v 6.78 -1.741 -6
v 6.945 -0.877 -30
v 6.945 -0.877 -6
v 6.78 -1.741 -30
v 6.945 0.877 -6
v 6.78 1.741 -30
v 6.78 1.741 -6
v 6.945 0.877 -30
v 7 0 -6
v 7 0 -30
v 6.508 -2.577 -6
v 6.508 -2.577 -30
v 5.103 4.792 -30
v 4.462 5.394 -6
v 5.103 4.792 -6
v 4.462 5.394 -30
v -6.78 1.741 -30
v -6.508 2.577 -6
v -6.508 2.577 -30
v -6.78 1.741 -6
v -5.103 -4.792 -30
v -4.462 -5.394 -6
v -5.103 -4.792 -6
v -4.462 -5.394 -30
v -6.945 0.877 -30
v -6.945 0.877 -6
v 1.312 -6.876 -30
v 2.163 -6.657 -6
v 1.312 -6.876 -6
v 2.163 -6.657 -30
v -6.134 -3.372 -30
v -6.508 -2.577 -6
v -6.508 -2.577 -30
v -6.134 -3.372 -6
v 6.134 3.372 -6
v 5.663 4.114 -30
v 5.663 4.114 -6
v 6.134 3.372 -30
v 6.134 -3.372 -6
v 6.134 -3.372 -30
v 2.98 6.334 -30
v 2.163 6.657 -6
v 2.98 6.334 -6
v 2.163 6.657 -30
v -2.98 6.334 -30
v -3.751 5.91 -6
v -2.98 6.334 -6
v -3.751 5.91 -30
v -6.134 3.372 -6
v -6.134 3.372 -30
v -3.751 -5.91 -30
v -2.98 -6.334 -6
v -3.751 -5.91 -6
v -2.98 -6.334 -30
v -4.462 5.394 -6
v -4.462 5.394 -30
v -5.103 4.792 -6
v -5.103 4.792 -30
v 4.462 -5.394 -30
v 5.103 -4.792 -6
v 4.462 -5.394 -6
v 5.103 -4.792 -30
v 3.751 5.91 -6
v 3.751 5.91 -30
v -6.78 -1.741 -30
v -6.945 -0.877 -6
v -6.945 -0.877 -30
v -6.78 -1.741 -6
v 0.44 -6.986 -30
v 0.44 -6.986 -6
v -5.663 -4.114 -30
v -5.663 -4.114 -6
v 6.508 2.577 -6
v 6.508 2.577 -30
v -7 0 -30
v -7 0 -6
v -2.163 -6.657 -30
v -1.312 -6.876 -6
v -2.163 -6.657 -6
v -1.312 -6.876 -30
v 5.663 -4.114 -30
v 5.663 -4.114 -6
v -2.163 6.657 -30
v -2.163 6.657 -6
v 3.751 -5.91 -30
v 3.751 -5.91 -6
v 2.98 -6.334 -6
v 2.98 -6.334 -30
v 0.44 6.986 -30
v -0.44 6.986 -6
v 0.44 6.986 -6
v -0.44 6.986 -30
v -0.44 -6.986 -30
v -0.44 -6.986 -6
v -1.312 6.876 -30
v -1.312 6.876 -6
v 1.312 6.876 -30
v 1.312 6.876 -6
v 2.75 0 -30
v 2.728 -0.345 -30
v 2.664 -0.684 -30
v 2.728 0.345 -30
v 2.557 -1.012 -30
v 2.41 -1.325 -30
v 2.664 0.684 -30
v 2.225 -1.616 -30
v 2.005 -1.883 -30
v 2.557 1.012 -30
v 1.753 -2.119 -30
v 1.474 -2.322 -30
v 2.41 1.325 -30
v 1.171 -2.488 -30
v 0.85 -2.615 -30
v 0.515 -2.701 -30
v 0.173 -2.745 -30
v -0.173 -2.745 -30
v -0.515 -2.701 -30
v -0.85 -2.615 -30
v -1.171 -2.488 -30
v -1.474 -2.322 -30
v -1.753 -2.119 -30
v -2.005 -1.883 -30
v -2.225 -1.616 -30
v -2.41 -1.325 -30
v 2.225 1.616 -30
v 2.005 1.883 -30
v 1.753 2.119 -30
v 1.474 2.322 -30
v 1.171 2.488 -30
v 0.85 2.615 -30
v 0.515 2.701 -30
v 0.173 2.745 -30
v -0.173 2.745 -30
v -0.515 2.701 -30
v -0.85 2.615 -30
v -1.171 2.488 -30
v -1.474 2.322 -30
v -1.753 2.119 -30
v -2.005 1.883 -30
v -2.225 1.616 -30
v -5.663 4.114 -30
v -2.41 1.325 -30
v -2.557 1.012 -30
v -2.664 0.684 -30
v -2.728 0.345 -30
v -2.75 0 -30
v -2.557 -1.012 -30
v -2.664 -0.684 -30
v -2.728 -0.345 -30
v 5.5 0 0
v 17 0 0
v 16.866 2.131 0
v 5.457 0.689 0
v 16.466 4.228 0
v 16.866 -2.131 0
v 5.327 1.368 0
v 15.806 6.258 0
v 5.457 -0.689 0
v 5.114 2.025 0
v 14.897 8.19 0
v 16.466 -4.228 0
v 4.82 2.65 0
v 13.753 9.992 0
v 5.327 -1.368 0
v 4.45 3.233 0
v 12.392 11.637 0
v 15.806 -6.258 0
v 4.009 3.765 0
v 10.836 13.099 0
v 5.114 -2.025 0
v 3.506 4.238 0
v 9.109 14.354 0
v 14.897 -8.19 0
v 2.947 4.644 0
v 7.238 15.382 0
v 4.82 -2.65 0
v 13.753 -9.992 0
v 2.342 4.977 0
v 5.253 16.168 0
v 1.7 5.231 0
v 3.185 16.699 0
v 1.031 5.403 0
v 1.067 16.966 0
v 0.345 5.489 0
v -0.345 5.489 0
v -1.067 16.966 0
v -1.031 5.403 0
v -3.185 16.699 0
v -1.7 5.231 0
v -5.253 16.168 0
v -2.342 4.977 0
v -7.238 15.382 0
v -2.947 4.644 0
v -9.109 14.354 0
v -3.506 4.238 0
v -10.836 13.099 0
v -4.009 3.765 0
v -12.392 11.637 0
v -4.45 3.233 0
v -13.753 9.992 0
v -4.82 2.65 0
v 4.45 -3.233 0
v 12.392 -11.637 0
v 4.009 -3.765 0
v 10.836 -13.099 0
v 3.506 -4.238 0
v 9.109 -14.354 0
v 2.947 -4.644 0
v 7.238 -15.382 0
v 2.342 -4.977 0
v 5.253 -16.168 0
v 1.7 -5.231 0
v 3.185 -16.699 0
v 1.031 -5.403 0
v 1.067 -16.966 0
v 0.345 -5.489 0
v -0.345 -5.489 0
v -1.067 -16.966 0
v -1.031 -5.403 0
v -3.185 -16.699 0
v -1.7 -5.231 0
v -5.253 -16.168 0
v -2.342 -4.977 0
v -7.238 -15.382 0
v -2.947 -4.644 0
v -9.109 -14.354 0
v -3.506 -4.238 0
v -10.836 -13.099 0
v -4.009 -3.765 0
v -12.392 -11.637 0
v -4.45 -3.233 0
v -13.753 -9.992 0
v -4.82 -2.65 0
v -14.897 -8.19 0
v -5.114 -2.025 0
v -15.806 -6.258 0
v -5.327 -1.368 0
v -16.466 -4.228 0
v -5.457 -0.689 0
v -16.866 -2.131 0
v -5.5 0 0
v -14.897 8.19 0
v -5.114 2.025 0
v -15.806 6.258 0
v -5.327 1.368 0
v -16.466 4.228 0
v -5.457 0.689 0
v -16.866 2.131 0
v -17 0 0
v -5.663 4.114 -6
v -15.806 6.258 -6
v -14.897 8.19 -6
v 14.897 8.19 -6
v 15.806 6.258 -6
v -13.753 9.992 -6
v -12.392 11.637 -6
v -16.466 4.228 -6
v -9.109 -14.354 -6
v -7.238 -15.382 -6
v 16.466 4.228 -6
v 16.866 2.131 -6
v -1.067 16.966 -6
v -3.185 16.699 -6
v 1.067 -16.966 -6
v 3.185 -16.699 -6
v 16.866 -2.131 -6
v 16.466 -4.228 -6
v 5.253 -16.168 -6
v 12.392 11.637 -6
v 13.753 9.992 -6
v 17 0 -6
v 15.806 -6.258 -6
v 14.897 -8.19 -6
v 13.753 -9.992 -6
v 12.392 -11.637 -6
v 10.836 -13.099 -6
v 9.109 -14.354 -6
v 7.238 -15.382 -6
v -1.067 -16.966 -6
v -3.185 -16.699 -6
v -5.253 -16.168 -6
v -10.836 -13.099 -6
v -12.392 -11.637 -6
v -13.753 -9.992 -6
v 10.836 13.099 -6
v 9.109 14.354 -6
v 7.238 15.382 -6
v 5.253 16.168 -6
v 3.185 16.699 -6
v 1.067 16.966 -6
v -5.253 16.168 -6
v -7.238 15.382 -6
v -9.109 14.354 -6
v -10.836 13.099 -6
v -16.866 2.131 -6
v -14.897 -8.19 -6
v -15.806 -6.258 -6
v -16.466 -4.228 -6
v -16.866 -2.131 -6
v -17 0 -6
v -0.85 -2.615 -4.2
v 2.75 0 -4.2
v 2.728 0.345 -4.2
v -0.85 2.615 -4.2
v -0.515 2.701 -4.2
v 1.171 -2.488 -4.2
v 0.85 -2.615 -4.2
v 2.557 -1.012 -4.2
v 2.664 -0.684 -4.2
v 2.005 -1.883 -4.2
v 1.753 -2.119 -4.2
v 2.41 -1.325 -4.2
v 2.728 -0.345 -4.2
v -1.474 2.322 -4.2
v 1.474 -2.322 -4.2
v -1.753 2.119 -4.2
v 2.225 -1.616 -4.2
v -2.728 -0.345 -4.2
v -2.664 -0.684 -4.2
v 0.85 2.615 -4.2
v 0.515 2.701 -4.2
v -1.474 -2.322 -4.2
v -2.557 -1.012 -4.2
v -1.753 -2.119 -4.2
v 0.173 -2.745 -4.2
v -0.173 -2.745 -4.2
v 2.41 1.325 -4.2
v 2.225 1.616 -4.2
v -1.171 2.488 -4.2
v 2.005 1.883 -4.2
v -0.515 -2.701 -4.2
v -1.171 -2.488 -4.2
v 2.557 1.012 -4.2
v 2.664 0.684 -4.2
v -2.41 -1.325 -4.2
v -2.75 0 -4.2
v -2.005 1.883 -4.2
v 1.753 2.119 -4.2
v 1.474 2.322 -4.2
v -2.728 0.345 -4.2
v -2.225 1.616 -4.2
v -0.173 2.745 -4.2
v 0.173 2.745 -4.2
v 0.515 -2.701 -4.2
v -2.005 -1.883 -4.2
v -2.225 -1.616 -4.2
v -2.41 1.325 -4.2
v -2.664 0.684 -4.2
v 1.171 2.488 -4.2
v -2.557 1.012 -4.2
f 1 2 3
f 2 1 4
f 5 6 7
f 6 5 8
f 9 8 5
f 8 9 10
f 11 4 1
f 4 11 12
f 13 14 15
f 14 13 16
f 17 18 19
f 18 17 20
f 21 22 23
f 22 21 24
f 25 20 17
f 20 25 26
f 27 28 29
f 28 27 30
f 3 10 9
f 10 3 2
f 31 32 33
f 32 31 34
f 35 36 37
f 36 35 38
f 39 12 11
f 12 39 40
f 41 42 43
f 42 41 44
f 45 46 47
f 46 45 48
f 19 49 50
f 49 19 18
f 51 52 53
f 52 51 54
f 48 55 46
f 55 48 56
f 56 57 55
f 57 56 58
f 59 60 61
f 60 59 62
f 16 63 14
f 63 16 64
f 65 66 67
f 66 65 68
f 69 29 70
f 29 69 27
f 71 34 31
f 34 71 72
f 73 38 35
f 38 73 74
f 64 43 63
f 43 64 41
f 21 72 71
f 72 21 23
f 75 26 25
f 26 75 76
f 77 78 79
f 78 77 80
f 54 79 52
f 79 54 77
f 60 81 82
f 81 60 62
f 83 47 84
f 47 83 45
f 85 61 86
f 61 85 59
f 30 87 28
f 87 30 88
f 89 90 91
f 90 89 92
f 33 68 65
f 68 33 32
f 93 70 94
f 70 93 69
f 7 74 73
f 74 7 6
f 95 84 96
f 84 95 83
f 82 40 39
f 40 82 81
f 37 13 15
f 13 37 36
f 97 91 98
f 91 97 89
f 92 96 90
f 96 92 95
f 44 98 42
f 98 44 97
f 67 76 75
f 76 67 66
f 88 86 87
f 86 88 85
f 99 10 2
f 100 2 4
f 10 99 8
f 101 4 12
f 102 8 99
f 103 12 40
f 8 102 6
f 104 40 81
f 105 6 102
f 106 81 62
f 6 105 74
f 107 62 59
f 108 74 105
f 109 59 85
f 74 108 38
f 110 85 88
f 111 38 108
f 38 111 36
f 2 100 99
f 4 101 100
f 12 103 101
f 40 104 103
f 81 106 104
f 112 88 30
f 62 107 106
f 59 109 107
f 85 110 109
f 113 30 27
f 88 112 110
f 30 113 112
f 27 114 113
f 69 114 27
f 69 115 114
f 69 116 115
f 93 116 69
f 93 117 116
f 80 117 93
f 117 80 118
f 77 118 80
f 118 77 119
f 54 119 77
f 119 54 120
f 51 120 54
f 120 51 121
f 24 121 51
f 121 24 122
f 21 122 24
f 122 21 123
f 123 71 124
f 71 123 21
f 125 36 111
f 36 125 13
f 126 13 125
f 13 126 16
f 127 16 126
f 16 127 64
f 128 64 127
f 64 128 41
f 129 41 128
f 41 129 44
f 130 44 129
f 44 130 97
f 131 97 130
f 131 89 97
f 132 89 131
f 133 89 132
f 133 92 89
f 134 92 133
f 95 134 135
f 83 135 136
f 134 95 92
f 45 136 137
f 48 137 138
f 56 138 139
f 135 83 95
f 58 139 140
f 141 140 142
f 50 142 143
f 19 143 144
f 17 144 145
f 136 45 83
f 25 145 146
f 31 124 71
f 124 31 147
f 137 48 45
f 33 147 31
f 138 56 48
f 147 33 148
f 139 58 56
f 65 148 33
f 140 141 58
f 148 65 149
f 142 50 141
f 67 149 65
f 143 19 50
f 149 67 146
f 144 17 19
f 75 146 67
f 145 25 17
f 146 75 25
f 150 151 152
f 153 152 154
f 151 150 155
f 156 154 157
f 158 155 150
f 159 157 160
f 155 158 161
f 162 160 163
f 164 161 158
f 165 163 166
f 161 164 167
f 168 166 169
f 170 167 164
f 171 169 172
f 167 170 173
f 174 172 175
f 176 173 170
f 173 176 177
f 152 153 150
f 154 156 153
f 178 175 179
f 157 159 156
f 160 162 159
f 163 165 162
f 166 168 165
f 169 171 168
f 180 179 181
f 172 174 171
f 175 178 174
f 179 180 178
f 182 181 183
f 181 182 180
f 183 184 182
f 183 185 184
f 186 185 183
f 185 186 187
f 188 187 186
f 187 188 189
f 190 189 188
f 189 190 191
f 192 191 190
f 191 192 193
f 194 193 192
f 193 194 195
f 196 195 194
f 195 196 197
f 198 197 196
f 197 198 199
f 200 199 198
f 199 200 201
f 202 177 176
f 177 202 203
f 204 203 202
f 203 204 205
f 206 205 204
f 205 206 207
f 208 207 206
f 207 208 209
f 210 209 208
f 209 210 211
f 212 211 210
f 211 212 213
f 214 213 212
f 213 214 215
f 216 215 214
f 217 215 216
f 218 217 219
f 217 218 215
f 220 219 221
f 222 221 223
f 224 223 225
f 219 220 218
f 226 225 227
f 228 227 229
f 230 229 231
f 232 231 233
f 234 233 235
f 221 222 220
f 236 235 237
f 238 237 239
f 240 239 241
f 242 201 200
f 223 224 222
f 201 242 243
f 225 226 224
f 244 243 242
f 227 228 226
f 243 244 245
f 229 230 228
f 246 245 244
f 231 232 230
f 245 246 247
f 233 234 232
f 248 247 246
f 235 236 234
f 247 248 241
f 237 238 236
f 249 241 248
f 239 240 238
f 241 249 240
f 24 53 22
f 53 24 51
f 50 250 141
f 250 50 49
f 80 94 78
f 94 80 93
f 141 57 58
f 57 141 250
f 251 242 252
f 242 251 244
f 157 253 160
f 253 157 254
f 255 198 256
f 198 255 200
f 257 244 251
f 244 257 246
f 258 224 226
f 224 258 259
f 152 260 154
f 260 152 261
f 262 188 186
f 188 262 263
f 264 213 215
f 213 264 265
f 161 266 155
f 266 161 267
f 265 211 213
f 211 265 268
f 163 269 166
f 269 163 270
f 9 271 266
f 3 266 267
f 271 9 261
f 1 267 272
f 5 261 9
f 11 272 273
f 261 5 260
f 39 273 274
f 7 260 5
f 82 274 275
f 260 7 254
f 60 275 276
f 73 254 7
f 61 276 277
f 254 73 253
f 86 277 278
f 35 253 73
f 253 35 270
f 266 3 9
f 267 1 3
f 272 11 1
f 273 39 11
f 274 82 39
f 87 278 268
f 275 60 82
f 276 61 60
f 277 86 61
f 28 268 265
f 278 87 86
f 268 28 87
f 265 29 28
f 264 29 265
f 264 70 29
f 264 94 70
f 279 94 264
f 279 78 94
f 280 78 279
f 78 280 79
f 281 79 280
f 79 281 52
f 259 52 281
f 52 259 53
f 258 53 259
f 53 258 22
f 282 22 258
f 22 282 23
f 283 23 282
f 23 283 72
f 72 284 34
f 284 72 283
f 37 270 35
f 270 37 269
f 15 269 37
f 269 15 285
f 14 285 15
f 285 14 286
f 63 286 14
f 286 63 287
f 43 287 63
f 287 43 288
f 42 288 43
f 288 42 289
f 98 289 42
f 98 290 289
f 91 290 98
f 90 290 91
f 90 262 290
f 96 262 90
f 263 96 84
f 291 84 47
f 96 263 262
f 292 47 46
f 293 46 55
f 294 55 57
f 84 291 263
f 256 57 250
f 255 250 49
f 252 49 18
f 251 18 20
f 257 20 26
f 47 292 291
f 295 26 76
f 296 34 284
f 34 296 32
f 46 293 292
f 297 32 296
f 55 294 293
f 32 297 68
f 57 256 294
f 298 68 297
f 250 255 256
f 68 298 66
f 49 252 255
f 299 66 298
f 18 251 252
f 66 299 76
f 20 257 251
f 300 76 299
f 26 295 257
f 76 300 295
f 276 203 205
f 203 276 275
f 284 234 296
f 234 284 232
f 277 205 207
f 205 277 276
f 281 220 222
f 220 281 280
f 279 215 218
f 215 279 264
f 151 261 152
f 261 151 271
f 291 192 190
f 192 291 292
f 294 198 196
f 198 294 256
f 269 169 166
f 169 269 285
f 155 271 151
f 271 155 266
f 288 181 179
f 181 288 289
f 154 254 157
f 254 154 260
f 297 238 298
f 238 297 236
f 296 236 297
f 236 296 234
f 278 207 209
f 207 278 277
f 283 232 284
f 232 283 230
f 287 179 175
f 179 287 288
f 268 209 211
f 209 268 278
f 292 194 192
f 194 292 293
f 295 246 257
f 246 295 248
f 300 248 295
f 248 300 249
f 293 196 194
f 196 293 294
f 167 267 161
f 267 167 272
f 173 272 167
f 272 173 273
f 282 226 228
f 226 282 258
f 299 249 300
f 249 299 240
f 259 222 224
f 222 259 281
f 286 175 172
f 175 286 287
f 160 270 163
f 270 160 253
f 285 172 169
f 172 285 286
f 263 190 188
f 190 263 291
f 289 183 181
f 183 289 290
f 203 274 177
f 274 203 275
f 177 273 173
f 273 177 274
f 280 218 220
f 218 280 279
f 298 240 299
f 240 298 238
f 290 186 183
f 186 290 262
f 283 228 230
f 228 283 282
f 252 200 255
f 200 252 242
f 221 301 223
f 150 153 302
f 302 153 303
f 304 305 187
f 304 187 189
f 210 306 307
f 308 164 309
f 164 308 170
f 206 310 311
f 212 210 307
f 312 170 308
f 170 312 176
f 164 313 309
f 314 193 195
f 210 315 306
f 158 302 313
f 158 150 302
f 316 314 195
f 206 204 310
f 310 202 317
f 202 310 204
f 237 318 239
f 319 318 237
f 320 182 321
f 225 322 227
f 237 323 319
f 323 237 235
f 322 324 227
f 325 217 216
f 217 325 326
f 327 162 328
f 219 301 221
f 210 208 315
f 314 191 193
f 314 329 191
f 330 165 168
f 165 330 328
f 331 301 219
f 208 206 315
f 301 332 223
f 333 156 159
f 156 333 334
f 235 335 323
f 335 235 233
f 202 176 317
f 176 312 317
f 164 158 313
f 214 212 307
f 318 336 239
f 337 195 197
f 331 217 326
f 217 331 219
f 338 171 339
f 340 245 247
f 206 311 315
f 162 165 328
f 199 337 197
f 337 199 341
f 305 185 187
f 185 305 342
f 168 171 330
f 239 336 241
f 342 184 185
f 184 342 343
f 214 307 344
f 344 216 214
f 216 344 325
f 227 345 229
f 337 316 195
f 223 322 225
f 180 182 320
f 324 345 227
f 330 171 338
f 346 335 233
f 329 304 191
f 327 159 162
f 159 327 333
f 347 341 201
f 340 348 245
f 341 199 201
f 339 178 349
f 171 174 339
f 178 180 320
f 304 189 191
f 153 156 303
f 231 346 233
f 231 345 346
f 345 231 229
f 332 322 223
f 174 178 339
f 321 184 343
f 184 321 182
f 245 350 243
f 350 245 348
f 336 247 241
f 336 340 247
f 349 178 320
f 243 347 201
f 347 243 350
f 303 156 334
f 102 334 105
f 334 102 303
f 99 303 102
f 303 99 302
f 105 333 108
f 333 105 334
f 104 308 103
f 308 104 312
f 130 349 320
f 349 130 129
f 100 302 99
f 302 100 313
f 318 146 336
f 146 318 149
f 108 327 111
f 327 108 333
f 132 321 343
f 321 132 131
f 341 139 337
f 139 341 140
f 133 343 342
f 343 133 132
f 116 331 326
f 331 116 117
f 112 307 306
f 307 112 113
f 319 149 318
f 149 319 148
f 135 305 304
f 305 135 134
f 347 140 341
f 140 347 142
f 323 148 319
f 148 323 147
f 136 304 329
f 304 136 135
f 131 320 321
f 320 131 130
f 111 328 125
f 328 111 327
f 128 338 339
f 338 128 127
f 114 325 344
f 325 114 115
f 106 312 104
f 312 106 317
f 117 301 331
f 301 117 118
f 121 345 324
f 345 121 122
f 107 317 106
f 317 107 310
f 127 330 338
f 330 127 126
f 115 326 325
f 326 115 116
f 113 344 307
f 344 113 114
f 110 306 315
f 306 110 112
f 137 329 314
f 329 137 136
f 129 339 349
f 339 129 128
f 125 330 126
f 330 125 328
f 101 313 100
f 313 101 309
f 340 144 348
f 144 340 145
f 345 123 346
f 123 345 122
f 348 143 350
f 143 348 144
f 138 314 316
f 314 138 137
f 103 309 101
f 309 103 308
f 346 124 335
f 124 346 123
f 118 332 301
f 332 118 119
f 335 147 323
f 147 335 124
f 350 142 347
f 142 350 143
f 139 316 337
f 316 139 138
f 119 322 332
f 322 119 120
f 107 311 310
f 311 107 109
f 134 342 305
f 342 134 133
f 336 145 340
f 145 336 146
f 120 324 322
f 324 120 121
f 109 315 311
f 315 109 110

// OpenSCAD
$fn = 50;


difference() {
	union() {
		translate(v = [0, 0, -30.0000000000]) {
			cylinder(h = 30, r = 7.0000000000);
		}
		translate(v = [0, 0, -6.0000000000]) {
			cylinder(h = 6, r = 17.0000000000);
		}
	}
	union() {
		translate(v = [0, 0, 0]) {
			rotate(a = [0, 0, 0]) {
				difference() {
					union() {
						#translate(v = [0, 0, -30.0000000000]) {
							cylinder(h = 30, r = 2.2500000000);
						}
						#translate(v = [0, 0, -4.2000000000]) {
							cylinder(h = 4.2000000000, r1 = 2.7500000000, r2 = 5.5000000000);
						}
						#translate(v = [0, 0, -30.0000000000]) {
							cylinder(h = 30, r = 2.7500000000);
						}
						#translate(v = [0, 0, -30.0000000000]) {
							cylinder(h = 30, r = 2.2500000000);
						}
					}
					union();
				}
			}
		}
	}
}
